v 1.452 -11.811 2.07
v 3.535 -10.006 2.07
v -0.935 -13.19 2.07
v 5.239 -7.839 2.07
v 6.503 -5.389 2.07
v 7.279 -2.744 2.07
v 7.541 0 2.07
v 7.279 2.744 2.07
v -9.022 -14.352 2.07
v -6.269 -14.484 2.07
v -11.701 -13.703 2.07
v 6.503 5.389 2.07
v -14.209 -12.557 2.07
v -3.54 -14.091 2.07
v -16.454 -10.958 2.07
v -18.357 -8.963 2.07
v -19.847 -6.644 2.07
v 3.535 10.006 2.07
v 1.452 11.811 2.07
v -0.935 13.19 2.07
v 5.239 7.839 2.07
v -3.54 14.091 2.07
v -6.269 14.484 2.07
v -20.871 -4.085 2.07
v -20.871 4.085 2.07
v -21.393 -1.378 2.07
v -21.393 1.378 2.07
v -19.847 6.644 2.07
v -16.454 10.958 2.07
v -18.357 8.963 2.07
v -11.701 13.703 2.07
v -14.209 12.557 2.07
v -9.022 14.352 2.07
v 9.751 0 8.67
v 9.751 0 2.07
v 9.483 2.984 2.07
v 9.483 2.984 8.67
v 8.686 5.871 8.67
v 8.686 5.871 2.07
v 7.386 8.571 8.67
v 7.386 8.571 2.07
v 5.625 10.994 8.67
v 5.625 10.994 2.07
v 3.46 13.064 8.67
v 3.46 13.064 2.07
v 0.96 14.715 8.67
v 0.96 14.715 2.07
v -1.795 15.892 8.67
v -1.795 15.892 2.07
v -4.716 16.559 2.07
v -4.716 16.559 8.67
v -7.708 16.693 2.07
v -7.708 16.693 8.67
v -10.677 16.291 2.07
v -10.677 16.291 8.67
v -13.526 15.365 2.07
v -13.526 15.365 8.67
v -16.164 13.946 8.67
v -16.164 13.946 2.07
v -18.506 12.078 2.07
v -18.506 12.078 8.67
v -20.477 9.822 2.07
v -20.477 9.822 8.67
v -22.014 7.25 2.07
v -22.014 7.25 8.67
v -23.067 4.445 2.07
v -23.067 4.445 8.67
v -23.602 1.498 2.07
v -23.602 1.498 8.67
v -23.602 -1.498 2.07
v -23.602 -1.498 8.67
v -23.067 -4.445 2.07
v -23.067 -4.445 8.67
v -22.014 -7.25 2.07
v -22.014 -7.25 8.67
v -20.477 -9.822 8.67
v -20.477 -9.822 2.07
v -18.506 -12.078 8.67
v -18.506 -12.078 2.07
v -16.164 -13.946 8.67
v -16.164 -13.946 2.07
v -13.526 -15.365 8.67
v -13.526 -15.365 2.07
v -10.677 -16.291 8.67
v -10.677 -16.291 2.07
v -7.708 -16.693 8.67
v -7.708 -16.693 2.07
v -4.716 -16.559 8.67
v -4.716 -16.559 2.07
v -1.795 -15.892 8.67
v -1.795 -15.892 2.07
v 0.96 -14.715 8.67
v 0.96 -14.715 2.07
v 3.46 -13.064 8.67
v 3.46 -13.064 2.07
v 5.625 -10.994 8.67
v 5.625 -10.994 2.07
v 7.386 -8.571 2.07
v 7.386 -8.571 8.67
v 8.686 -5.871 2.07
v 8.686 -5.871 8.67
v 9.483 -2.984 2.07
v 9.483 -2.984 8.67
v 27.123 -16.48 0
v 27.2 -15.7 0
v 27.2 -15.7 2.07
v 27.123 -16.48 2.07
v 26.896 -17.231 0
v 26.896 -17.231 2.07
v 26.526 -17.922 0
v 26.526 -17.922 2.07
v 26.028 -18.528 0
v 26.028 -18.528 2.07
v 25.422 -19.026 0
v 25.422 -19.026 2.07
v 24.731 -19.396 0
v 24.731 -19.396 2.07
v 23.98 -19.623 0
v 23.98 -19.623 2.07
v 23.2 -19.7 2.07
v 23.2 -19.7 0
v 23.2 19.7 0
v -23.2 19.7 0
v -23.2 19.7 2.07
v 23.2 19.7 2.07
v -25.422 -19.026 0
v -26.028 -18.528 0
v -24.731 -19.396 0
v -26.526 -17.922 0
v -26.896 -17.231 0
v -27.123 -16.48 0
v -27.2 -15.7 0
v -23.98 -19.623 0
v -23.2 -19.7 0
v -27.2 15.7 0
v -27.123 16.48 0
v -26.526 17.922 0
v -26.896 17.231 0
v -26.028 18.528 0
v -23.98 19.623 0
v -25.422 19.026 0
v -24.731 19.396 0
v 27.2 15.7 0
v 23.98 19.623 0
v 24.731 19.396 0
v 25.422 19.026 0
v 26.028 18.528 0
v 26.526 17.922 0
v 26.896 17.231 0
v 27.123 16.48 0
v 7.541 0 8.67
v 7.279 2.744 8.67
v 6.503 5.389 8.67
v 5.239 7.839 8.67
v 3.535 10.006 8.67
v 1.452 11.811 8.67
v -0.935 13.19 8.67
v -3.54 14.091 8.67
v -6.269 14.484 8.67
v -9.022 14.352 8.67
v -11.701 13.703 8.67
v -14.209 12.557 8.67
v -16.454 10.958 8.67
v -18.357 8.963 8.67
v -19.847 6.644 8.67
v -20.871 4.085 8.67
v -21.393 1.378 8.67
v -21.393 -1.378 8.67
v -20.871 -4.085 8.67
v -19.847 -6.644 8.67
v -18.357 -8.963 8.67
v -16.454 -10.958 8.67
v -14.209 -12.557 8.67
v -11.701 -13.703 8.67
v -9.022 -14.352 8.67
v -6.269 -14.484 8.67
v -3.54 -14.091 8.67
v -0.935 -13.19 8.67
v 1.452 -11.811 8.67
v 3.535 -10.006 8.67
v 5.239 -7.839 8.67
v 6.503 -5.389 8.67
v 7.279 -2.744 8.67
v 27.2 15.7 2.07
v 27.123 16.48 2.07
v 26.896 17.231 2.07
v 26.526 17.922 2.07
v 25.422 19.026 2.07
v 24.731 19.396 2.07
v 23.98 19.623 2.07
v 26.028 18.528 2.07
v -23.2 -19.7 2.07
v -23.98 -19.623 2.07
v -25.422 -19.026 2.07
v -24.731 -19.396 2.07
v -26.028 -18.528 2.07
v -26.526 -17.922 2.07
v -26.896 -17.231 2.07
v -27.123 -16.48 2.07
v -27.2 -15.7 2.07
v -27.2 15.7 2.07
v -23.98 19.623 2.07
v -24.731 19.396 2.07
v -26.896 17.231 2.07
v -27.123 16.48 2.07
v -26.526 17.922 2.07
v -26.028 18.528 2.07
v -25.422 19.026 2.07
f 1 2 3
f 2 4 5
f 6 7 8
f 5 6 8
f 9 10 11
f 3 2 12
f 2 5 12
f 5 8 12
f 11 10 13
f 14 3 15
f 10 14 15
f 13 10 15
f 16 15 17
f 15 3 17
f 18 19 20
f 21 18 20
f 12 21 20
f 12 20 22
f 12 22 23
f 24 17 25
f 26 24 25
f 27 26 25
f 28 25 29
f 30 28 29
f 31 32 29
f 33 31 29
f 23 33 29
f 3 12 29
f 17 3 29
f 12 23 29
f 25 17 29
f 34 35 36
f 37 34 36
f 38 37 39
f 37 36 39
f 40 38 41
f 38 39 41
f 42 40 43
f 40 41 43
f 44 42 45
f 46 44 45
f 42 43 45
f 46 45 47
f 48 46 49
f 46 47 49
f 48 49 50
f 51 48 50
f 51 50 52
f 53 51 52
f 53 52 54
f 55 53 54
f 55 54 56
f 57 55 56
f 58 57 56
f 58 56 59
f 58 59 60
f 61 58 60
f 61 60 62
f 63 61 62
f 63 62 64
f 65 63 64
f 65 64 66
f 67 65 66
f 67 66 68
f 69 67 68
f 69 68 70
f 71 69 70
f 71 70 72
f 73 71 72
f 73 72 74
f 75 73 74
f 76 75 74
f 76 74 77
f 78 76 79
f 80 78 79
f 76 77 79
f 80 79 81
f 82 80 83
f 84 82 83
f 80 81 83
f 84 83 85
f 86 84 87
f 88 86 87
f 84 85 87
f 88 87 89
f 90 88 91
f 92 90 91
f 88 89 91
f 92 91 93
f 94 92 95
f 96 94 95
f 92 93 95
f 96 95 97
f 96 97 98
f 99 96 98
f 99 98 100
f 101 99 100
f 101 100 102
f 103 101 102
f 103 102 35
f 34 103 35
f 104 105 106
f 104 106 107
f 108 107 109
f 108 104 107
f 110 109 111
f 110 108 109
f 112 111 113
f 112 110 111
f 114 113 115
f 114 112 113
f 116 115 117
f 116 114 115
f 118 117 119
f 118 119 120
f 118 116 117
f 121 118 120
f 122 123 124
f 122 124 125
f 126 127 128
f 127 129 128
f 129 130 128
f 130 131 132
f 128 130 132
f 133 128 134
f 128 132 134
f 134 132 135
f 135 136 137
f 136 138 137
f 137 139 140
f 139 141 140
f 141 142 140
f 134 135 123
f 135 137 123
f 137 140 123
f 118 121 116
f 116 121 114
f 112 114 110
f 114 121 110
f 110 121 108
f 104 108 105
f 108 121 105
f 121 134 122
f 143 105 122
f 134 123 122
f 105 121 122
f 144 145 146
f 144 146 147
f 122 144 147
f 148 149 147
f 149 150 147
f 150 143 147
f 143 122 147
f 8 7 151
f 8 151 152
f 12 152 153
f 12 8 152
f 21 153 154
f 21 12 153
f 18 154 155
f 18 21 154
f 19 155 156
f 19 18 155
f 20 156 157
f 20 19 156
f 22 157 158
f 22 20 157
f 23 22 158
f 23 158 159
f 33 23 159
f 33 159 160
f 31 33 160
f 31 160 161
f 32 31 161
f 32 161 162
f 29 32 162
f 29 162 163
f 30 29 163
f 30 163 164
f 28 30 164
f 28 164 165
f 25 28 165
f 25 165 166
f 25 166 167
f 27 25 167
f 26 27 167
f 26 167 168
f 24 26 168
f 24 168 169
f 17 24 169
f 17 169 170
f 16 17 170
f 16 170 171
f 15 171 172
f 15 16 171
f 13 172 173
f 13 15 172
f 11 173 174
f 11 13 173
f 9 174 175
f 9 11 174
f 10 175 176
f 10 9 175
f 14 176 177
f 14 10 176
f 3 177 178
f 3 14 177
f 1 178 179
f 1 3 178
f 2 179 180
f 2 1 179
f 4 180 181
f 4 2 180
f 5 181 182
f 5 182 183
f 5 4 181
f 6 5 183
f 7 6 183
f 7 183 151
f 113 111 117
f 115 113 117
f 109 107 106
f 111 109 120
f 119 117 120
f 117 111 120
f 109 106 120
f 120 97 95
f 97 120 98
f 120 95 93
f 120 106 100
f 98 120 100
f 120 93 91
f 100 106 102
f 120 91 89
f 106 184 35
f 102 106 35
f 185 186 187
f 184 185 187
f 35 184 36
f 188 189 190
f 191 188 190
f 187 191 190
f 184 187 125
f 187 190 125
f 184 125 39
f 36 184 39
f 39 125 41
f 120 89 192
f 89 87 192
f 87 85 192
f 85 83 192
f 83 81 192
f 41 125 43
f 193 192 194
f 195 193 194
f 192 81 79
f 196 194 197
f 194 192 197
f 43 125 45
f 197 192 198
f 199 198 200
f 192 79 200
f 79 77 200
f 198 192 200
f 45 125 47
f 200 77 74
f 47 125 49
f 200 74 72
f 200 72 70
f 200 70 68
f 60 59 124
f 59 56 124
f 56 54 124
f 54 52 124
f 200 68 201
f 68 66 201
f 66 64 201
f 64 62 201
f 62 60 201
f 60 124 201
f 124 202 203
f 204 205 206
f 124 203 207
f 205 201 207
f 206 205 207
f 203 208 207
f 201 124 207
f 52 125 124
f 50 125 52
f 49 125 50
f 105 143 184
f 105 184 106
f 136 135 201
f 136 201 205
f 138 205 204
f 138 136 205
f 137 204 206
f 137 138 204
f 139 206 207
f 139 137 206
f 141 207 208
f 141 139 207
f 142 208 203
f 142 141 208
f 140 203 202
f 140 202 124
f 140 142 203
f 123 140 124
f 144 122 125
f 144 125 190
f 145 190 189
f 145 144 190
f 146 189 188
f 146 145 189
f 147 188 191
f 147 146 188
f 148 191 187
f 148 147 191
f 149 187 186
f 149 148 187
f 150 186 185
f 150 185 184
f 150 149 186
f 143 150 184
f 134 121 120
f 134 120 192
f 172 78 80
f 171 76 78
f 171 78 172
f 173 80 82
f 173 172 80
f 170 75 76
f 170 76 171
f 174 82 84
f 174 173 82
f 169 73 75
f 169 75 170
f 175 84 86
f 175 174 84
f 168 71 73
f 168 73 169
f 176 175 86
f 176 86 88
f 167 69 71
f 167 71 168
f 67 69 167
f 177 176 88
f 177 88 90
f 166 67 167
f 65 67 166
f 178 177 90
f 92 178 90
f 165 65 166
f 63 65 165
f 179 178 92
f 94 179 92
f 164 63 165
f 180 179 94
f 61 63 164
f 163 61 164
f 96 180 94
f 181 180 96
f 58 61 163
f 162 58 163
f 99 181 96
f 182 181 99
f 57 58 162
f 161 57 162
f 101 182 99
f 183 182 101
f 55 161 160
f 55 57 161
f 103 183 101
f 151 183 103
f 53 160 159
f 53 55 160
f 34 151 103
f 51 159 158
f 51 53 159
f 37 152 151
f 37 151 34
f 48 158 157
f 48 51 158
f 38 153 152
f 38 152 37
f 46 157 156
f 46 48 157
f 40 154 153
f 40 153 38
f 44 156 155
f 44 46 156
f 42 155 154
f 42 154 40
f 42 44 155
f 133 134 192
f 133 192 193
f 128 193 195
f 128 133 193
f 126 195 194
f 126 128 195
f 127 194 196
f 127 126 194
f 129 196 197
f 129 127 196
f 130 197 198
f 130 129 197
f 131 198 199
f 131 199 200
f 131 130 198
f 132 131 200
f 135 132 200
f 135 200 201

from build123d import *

# Parameters (mm, degrees)
BOSS_EXTRUDE1_DEPTH = 2.07
SKETCH3_R           = 16.71
SKETCH3_R_2         = 14.5
EXTRUDE_THIN1_DEPTH = 8.67


with BuildPart() as part:
    # Sketch1 → Boss-Extrude1 (new body)
    with BuildSketch(Plane.XY):
        with BuildLine():
            Line((23.2, -19.7), (-23.2, -19.7))
            ThreePointArc((-23.2, -19.7), (-26.028427125, -18.528427125), (-27.2, -15.7))
            Line((-27.2, -15.7), (-27.2, 15.7))
            ThreePointArc((-27.2, 15.7), (-26.028427125, 18.528427125), (-23.2, 19.7))
            Line((-23.2, 19.7), (23.2, 19.7))
            ThreePointArc((23.2, 19.7), (26.028427125, 18.528427125), (27.2, 15.7))
            Line((27.2, 15.7), (27.2, -15.7))
            ThreePointArc((27.2, -15.7), (26.028427125, -18.528427125), (23.2, -19.7))
        make_face()
    extrude(amount=BOSS_EXTRUDE1_DEPTH)

    # Sketch3 → Extrude-Thin1 (add)
    with BuildSketch(Plane.XY):
        with Locations((-6.958808182, 0)):
            Circle(SKETCH3_R)
        with Locations((-6.958808182, 0)):
            Circle(SKETCH3_R_2, mode=Mode.SUBTRACT)
    extrude(amount=EXTRUDE_THIN1_DEPTH)


solid = part.part
